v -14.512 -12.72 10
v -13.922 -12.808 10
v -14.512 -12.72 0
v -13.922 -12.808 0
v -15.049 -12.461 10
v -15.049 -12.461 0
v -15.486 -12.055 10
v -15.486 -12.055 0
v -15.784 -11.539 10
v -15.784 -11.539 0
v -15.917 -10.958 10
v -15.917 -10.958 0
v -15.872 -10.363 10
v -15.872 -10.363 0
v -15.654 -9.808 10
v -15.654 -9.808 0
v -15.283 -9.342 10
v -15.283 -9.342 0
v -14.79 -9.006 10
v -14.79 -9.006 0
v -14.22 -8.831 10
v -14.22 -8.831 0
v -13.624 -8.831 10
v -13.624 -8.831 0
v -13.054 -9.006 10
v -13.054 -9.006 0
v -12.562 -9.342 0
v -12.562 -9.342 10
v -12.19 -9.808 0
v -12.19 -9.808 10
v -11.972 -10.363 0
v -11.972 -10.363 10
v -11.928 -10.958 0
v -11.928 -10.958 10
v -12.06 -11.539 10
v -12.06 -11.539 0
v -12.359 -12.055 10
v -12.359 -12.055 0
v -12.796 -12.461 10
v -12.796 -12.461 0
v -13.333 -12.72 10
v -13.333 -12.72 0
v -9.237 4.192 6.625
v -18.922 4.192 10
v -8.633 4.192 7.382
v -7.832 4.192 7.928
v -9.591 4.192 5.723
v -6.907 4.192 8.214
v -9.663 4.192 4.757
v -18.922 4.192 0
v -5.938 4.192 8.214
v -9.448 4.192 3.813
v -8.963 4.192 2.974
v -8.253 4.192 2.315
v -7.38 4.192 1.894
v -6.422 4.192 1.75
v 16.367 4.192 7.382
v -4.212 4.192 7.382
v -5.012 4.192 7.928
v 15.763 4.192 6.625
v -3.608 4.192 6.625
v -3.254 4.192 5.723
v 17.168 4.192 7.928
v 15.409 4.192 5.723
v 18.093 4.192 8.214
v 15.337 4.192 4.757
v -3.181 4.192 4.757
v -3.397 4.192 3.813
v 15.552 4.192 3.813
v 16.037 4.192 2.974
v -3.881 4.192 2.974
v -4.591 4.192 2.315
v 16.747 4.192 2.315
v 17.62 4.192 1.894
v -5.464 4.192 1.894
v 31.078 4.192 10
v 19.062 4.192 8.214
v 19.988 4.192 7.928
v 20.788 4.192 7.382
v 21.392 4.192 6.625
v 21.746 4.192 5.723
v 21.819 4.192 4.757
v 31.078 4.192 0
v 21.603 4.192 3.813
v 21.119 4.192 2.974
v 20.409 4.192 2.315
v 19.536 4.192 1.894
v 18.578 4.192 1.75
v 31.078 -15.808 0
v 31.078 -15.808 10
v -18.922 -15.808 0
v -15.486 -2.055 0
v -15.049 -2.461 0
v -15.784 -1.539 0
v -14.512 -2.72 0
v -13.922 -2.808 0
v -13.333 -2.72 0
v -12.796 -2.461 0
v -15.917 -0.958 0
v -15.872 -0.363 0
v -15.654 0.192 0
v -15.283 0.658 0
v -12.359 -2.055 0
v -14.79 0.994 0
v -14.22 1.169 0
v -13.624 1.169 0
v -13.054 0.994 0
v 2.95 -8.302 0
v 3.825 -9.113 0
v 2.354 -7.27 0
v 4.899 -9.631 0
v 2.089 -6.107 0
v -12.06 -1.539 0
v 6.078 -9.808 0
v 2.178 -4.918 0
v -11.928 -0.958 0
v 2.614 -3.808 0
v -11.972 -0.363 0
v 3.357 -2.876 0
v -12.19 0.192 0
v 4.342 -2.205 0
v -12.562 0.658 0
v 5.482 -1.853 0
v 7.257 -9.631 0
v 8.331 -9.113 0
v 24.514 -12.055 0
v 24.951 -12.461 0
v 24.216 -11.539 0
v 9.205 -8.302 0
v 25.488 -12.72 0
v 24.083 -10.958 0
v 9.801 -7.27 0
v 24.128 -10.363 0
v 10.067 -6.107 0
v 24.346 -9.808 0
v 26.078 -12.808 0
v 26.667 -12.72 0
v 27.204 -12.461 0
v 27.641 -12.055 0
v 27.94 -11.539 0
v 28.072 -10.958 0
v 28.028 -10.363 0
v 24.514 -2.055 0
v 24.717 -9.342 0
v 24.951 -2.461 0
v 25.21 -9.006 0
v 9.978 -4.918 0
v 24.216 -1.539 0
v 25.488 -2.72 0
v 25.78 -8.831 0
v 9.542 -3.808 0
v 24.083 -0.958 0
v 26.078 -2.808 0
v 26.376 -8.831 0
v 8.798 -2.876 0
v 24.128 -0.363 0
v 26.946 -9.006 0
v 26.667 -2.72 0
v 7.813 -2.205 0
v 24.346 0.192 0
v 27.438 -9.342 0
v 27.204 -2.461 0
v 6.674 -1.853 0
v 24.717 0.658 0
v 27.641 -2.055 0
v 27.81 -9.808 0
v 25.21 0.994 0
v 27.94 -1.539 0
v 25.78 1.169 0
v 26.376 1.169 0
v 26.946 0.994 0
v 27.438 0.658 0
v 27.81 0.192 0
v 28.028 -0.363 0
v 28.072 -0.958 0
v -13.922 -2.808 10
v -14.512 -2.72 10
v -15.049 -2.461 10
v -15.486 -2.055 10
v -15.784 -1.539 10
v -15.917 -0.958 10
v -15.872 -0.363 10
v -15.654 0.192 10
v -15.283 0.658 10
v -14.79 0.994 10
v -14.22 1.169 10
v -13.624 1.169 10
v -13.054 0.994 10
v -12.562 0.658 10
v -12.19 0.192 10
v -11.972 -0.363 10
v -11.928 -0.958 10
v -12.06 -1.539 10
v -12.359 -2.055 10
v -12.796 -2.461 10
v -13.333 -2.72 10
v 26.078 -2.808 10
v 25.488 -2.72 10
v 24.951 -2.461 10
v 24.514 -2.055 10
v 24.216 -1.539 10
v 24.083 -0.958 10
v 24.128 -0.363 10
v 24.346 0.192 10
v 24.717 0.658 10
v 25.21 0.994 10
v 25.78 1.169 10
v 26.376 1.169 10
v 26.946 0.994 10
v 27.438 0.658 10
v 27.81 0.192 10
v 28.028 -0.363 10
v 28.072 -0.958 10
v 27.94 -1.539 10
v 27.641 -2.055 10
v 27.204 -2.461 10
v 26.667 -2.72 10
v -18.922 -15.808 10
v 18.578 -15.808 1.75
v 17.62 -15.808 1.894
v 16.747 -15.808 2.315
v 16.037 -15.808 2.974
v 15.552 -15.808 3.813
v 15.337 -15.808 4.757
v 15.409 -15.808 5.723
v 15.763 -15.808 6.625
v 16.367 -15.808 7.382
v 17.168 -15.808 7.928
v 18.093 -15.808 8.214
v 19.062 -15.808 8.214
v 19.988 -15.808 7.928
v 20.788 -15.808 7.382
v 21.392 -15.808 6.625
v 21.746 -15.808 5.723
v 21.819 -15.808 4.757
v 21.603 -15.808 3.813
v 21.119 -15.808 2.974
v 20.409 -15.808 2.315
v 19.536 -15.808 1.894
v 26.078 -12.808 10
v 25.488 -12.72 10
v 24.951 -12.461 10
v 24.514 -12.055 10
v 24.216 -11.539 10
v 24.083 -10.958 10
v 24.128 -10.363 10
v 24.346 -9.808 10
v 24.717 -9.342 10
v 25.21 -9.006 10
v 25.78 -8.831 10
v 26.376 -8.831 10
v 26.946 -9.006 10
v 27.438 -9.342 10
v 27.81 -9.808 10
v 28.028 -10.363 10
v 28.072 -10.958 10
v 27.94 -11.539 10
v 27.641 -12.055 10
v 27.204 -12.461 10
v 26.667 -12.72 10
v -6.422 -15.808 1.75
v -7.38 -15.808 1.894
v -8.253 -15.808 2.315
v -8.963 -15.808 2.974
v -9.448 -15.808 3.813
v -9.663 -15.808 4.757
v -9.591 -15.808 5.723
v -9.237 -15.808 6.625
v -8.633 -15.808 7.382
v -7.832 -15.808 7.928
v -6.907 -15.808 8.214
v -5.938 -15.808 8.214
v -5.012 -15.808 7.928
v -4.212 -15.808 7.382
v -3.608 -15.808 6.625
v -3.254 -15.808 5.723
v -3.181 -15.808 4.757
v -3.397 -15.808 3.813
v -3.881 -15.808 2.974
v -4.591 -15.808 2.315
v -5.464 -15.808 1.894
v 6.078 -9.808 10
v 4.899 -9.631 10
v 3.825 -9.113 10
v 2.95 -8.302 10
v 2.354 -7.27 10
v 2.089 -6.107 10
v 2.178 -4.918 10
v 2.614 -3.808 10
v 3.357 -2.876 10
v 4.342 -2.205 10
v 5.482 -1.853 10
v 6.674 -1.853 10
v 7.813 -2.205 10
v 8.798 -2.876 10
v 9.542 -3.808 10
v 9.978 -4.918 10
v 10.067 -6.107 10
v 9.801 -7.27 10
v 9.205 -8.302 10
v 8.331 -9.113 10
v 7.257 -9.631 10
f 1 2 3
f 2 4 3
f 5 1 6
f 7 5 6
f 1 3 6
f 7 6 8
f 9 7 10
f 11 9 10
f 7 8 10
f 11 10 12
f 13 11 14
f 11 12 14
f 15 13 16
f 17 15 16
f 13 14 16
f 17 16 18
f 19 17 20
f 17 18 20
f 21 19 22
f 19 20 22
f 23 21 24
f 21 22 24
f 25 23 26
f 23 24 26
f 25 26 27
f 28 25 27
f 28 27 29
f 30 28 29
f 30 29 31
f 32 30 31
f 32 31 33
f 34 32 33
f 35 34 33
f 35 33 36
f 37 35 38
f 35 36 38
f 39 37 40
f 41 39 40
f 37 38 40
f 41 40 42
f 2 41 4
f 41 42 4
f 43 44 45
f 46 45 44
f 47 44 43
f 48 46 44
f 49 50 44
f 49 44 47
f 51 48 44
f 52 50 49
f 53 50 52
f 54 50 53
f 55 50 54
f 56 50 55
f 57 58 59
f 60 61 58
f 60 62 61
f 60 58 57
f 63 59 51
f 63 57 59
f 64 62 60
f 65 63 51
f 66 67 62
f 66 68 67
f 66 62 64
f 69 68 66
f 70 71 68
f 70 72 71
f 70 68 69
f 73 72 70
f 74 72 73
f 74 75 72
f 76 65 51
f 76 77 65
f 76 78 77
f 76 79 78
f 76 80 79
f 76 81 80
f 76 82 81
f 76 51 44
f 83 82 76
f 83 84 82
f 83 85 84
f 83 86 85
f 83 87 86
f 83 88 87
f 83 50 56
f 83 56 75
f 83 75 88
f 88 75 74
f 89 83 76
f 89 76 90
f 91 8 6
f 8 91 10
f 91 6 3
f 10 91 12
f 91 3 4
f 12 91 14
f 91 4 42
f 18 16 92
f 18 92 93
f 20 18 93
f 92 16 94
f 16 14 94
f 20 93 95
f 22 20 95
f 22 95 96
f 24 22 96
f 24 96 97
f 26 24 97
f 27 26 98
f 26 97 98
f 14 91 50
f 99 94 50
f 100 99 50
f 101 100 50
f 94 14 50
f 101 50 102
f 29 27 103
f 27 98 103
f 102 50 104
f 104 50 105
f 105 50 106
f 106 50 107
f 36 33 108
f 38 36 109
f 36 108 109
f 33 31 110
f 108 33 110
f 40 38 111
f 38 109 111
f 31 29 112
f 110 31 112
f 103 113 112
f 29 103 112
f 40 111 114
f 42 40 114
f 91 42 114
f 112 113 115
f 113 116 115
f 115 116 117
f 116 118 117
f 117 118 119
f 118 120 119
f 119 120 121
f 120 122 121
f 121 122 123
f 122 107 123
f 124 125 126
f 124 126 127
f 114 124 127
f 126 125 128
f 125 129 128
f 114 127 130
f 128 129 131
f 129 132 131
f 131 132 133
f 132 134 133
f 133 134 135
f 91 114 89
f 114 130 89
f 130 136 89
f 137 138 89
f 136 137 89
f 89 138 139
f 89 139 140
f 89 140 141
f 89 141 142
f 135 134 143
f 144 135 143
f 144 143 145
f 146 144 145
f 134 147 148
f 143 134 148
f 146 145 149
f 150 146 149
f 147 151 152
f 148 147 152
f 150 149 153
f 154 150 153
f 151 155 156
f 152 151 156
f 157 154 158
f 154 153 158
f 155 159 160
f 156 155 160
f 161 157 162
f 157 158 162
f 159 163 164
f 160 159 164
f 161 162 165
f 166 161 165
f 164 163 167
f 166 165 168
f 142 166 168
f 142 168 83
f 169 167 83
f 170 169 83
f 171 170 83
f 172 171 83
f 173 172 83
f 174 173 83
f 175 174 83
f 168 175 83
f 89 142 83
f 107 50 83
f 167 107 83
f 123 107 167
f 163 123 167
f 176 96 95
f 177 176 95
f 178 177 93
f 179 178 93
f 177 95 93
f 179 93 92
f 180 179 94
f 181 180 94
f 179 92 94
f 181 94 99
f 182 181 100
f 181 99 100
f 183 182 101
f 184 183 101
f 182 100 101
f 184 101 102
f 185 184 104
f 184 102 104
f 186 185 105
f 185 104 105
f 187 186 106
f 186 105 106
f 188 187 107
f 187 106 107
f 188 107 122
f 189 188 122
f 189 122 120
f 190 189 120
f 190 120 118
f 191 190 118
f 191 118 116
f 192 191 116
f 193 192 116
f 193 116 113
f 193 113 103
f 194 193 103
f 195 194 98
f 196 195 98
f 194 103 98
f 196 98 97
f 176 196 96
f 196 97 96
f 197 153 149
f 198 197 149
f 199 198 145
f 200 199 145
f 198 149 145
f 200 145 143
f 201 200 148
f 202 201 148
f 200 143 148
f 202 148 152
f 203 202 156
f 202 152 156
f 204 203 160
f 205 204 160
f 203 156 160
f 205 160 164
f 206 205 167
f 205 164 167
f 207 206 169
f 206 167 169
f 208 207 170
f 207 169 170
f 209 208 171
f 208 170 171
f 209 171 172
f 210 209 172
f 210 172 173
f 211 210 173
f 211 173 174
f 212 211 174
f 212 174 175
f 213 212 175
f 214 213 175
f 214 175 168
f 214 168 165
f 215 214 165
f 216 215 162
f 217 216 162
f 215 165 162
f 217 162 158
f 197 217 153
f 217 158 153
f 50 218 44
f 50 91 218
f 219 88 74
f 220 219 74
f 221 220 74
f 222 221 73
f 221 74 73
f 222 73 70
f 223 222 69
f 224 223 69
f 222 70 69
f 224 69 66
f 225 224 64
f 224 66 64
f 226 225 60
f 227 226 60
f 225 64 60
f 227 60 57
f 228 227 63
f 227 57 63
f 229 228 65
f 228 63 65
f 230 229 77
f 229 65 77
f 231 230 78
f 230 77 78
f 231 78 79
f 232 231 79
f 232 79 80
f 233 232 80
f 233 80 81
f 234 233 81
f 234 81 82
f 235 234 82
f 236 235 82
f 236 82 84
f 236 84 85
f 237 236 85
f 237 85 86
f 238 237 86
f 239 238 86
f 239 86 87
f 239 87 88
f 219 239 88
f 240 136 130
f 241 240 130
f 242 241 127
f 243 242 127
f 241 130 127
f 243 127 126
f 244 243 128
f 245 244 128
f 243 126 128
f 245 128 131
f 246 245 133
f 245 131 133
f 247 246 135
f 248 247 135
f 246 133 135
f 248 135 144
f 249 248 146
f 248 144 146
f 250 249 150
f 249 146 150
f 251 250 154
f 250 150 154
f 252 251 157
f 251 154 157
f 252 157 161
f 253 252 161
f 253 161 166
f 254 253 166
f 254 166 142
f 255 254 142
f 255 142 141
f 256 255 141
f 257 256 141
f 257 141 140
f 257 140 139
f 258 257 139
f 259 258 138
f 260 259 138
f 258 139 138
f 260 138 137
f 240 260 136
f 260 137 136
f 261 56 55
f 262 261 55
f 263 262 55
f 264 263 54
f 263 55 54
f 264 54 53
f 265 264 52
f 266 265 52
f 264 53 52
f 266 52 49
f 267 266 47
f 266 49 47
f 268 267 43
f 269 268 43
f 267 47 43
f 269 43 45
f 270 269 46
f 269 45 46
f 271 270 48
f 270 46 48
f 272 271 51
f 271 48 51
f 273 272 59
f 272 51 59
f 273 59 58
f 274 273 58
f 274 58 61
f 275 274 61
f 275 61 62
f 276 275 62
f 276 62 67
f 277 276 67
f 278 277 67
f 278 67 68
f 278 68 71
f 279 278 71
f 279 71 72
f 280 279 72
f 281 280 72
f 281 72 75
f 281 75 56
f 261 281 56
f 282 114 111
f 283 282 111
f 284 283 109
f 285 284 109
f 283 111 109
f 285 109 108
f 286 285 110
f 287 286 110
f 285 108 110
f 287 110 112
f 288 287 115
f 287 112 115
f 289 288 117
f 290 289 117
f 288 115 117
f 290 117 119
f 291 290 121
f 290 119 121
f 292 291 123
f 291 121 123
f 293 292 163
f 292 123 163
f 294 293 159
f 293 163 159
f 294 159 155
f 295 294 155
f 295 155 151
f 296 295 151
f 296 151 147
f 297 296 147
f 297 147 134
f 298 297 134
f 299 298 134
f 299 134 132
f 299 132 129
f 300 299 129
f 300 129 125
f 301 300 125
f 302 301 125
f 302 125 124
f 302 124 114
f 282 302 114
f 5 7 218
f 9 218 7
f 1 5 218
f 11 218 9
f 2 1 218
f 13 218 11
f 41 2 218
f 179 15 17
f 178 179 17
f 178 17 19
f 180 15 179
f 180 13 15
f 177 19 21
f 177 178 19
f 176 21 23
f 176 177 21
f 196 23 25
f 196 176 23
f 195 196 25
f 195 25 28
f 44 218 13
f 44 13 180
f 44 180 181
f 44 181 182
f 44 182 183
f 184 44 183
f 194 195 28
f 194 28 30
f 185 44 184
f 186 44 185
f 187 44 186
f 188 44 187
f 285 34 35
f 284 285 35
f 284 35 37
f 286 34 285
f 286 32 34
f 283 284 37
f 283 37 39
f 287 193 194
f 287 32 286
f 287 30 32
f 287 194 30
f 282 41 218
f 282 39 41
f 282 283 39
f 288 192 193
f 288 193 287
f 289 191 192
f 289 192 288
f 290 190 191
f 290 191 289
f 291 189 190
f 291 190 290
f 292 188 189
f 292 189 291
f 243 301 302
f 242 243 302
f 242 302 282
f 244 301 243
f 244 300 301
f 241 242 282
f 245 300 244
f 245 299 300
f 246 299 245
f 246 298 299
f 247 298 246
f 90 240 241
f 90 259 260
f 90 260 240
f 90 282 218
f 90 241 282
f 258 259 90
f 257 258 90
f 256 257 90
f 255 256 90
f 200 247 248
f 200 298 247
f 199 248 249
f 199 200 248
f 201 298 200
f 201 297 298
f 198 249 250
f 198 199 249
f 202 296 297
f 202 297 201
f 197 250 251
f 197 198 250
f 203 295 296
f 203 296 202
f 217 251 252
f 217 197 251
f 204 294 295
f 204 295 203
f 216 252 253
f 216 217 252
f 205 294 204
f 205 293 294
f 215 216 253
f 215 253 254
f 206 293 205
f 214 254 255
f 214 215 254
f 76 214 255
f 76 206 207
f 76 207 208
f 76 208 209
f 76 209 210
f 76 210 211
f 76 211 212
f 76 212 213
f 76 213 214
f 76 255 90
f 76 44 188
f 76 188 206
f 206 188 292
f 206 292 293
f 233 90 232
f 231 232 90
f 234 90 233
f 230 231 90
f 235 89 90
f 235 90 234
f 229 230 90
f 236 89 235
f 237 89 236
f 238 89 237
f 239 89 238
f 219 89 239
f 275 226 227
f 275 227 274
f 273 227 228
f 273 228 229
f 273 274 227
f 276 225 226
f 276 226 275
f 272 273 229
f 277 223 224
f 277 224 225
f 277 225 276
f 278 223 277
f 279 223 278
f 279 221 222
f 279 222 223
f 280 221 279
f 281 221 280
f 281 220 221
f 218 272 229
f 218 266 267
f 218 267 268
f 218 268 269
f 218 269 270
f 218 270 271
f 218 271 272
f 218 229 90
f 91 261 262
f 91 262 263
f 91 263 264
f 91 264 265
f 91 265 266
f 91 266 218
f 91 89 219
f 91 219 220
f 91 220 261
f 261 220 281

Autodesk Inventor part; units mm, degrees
ref_plane "YZ Plane" through (0, 0, 0) normal (1, 0, 0) x (0, 1, 0)
ref_plane "XZ Plane" through (0, 0, 0) normal (0, 1, 0) x (-1, 0, 0)
ref_plane "XY Plane" through (0, 0, 0) normal (0, 0, 1) x (1, 0, 0)
sketch "Sketch1" plane through (0, 0, 0) normal (0, 0, 1) x (1, 0, 0)
  line L0 (-18.9222, 4.1916) -> (31.0778, 4.1916)
  line L1 (31.0778, 4.1916) -> (31.0778, -15.8084)
  line L2 (31.0778, -15.8084) -> (-18.9222, -15.8084)
  line L3 (-18.9222, -15.8084) -> (-18.9222, 4.1916)
  dimension "d2" = 50
  dimension "d3" = 20
extrude "Extrusion1" add sketch "Sketch1" along normal blind 10
sketch "Sketch2" plane through (-18.9222, -15.8084, 0) normal (0, -1, 0) x (1, 0, 0)
  line L0 (0, 0) -> (0, 10) projected
  line L1 (50, 0) -> (50, 10) projected
  point P0 (18.9222, 0)
  point P1 (12.5, 5)
  point P2 (37.5, 5)
  dimension "d6" = 12.5
  dimension "d7" = 12.5
  dimension "d35" = 50
hole "Hole1" at (-6.4222, -15.8084, 5) at (18.5778, -15.8084, 5) direction (0, 1, 0) diameter 6.5 end through all
sketch "Sketch3" plane through (0, 0, 10) normal (0, 0, 1) x (1, 0, 0)
  line L0 (31.0778, 4.1916) -> (31.0778, -15.8084) projected
  line L1 (31.0778, -15.8084) -> (-18.9222, -15.8084) projected
  point P0 (0, 0)
  point P1 (6.0778, -5.8084)
  dimension "d36" = 20
  dimension "d37" = 50
  dimension "d38" = 25
  dimension "d39" = 10
hole "Hole2" at (6.0778, -5.8084, 10) direction (0, 0, -1) diameter 8 end through all
sketch "Sketch4" plane through (0, 0, 10) normal (0, 0, 1) x (1, 0, 0)
  line L0 (-18.9222, -15.8084) -> (-18.9222, 4.1916) projected
  line L1 (31.0778, -15.8084) -> (-18.9222, -15.8084) projected
  line L2 (-13.9222, -0.8084) -> (26.0778, -0.8084)
  line L3 (26.0778, -0.8084) -> (26.0778, -10.8084)
  line L4 (26.0778, -10.8084) -> (-13.9222, -10.8084)
  line L5 (-13.9222, -10.8084) -> (-13.9222, -0.8084)
  point P0 (31.0778, 4.1916)
  point P1 (0, 0)
  dimension "d22" = 50
  dimension "d23" = 40
  dimension "d24" = 10
  dimension "d25" = 20
  dimension "d26" = 5
  dimension "d27" = 5
hole "Hole3" at (-13.9222, -0.8084, 10) at (26.0778, -0.8084, 10) at (26.0778, -10.8084, 10) at (-13.9222, -10.8084, 10) direction (0, 0, -1) diameter 4 end through all
equation "\"d6\" = d7"
equation "\"d7\" = 0.25 * d35"
equation "\"d38\" = 0.5 * d37"
equation "\"d39\" = 0.5 * d36"
equation "\"d26\" = -0.5 * d24 + 0.5 * d25"
equation "\"d27\" = -0.5 * d23 + 0.5 * d22"
properties part number "montura tensor"
